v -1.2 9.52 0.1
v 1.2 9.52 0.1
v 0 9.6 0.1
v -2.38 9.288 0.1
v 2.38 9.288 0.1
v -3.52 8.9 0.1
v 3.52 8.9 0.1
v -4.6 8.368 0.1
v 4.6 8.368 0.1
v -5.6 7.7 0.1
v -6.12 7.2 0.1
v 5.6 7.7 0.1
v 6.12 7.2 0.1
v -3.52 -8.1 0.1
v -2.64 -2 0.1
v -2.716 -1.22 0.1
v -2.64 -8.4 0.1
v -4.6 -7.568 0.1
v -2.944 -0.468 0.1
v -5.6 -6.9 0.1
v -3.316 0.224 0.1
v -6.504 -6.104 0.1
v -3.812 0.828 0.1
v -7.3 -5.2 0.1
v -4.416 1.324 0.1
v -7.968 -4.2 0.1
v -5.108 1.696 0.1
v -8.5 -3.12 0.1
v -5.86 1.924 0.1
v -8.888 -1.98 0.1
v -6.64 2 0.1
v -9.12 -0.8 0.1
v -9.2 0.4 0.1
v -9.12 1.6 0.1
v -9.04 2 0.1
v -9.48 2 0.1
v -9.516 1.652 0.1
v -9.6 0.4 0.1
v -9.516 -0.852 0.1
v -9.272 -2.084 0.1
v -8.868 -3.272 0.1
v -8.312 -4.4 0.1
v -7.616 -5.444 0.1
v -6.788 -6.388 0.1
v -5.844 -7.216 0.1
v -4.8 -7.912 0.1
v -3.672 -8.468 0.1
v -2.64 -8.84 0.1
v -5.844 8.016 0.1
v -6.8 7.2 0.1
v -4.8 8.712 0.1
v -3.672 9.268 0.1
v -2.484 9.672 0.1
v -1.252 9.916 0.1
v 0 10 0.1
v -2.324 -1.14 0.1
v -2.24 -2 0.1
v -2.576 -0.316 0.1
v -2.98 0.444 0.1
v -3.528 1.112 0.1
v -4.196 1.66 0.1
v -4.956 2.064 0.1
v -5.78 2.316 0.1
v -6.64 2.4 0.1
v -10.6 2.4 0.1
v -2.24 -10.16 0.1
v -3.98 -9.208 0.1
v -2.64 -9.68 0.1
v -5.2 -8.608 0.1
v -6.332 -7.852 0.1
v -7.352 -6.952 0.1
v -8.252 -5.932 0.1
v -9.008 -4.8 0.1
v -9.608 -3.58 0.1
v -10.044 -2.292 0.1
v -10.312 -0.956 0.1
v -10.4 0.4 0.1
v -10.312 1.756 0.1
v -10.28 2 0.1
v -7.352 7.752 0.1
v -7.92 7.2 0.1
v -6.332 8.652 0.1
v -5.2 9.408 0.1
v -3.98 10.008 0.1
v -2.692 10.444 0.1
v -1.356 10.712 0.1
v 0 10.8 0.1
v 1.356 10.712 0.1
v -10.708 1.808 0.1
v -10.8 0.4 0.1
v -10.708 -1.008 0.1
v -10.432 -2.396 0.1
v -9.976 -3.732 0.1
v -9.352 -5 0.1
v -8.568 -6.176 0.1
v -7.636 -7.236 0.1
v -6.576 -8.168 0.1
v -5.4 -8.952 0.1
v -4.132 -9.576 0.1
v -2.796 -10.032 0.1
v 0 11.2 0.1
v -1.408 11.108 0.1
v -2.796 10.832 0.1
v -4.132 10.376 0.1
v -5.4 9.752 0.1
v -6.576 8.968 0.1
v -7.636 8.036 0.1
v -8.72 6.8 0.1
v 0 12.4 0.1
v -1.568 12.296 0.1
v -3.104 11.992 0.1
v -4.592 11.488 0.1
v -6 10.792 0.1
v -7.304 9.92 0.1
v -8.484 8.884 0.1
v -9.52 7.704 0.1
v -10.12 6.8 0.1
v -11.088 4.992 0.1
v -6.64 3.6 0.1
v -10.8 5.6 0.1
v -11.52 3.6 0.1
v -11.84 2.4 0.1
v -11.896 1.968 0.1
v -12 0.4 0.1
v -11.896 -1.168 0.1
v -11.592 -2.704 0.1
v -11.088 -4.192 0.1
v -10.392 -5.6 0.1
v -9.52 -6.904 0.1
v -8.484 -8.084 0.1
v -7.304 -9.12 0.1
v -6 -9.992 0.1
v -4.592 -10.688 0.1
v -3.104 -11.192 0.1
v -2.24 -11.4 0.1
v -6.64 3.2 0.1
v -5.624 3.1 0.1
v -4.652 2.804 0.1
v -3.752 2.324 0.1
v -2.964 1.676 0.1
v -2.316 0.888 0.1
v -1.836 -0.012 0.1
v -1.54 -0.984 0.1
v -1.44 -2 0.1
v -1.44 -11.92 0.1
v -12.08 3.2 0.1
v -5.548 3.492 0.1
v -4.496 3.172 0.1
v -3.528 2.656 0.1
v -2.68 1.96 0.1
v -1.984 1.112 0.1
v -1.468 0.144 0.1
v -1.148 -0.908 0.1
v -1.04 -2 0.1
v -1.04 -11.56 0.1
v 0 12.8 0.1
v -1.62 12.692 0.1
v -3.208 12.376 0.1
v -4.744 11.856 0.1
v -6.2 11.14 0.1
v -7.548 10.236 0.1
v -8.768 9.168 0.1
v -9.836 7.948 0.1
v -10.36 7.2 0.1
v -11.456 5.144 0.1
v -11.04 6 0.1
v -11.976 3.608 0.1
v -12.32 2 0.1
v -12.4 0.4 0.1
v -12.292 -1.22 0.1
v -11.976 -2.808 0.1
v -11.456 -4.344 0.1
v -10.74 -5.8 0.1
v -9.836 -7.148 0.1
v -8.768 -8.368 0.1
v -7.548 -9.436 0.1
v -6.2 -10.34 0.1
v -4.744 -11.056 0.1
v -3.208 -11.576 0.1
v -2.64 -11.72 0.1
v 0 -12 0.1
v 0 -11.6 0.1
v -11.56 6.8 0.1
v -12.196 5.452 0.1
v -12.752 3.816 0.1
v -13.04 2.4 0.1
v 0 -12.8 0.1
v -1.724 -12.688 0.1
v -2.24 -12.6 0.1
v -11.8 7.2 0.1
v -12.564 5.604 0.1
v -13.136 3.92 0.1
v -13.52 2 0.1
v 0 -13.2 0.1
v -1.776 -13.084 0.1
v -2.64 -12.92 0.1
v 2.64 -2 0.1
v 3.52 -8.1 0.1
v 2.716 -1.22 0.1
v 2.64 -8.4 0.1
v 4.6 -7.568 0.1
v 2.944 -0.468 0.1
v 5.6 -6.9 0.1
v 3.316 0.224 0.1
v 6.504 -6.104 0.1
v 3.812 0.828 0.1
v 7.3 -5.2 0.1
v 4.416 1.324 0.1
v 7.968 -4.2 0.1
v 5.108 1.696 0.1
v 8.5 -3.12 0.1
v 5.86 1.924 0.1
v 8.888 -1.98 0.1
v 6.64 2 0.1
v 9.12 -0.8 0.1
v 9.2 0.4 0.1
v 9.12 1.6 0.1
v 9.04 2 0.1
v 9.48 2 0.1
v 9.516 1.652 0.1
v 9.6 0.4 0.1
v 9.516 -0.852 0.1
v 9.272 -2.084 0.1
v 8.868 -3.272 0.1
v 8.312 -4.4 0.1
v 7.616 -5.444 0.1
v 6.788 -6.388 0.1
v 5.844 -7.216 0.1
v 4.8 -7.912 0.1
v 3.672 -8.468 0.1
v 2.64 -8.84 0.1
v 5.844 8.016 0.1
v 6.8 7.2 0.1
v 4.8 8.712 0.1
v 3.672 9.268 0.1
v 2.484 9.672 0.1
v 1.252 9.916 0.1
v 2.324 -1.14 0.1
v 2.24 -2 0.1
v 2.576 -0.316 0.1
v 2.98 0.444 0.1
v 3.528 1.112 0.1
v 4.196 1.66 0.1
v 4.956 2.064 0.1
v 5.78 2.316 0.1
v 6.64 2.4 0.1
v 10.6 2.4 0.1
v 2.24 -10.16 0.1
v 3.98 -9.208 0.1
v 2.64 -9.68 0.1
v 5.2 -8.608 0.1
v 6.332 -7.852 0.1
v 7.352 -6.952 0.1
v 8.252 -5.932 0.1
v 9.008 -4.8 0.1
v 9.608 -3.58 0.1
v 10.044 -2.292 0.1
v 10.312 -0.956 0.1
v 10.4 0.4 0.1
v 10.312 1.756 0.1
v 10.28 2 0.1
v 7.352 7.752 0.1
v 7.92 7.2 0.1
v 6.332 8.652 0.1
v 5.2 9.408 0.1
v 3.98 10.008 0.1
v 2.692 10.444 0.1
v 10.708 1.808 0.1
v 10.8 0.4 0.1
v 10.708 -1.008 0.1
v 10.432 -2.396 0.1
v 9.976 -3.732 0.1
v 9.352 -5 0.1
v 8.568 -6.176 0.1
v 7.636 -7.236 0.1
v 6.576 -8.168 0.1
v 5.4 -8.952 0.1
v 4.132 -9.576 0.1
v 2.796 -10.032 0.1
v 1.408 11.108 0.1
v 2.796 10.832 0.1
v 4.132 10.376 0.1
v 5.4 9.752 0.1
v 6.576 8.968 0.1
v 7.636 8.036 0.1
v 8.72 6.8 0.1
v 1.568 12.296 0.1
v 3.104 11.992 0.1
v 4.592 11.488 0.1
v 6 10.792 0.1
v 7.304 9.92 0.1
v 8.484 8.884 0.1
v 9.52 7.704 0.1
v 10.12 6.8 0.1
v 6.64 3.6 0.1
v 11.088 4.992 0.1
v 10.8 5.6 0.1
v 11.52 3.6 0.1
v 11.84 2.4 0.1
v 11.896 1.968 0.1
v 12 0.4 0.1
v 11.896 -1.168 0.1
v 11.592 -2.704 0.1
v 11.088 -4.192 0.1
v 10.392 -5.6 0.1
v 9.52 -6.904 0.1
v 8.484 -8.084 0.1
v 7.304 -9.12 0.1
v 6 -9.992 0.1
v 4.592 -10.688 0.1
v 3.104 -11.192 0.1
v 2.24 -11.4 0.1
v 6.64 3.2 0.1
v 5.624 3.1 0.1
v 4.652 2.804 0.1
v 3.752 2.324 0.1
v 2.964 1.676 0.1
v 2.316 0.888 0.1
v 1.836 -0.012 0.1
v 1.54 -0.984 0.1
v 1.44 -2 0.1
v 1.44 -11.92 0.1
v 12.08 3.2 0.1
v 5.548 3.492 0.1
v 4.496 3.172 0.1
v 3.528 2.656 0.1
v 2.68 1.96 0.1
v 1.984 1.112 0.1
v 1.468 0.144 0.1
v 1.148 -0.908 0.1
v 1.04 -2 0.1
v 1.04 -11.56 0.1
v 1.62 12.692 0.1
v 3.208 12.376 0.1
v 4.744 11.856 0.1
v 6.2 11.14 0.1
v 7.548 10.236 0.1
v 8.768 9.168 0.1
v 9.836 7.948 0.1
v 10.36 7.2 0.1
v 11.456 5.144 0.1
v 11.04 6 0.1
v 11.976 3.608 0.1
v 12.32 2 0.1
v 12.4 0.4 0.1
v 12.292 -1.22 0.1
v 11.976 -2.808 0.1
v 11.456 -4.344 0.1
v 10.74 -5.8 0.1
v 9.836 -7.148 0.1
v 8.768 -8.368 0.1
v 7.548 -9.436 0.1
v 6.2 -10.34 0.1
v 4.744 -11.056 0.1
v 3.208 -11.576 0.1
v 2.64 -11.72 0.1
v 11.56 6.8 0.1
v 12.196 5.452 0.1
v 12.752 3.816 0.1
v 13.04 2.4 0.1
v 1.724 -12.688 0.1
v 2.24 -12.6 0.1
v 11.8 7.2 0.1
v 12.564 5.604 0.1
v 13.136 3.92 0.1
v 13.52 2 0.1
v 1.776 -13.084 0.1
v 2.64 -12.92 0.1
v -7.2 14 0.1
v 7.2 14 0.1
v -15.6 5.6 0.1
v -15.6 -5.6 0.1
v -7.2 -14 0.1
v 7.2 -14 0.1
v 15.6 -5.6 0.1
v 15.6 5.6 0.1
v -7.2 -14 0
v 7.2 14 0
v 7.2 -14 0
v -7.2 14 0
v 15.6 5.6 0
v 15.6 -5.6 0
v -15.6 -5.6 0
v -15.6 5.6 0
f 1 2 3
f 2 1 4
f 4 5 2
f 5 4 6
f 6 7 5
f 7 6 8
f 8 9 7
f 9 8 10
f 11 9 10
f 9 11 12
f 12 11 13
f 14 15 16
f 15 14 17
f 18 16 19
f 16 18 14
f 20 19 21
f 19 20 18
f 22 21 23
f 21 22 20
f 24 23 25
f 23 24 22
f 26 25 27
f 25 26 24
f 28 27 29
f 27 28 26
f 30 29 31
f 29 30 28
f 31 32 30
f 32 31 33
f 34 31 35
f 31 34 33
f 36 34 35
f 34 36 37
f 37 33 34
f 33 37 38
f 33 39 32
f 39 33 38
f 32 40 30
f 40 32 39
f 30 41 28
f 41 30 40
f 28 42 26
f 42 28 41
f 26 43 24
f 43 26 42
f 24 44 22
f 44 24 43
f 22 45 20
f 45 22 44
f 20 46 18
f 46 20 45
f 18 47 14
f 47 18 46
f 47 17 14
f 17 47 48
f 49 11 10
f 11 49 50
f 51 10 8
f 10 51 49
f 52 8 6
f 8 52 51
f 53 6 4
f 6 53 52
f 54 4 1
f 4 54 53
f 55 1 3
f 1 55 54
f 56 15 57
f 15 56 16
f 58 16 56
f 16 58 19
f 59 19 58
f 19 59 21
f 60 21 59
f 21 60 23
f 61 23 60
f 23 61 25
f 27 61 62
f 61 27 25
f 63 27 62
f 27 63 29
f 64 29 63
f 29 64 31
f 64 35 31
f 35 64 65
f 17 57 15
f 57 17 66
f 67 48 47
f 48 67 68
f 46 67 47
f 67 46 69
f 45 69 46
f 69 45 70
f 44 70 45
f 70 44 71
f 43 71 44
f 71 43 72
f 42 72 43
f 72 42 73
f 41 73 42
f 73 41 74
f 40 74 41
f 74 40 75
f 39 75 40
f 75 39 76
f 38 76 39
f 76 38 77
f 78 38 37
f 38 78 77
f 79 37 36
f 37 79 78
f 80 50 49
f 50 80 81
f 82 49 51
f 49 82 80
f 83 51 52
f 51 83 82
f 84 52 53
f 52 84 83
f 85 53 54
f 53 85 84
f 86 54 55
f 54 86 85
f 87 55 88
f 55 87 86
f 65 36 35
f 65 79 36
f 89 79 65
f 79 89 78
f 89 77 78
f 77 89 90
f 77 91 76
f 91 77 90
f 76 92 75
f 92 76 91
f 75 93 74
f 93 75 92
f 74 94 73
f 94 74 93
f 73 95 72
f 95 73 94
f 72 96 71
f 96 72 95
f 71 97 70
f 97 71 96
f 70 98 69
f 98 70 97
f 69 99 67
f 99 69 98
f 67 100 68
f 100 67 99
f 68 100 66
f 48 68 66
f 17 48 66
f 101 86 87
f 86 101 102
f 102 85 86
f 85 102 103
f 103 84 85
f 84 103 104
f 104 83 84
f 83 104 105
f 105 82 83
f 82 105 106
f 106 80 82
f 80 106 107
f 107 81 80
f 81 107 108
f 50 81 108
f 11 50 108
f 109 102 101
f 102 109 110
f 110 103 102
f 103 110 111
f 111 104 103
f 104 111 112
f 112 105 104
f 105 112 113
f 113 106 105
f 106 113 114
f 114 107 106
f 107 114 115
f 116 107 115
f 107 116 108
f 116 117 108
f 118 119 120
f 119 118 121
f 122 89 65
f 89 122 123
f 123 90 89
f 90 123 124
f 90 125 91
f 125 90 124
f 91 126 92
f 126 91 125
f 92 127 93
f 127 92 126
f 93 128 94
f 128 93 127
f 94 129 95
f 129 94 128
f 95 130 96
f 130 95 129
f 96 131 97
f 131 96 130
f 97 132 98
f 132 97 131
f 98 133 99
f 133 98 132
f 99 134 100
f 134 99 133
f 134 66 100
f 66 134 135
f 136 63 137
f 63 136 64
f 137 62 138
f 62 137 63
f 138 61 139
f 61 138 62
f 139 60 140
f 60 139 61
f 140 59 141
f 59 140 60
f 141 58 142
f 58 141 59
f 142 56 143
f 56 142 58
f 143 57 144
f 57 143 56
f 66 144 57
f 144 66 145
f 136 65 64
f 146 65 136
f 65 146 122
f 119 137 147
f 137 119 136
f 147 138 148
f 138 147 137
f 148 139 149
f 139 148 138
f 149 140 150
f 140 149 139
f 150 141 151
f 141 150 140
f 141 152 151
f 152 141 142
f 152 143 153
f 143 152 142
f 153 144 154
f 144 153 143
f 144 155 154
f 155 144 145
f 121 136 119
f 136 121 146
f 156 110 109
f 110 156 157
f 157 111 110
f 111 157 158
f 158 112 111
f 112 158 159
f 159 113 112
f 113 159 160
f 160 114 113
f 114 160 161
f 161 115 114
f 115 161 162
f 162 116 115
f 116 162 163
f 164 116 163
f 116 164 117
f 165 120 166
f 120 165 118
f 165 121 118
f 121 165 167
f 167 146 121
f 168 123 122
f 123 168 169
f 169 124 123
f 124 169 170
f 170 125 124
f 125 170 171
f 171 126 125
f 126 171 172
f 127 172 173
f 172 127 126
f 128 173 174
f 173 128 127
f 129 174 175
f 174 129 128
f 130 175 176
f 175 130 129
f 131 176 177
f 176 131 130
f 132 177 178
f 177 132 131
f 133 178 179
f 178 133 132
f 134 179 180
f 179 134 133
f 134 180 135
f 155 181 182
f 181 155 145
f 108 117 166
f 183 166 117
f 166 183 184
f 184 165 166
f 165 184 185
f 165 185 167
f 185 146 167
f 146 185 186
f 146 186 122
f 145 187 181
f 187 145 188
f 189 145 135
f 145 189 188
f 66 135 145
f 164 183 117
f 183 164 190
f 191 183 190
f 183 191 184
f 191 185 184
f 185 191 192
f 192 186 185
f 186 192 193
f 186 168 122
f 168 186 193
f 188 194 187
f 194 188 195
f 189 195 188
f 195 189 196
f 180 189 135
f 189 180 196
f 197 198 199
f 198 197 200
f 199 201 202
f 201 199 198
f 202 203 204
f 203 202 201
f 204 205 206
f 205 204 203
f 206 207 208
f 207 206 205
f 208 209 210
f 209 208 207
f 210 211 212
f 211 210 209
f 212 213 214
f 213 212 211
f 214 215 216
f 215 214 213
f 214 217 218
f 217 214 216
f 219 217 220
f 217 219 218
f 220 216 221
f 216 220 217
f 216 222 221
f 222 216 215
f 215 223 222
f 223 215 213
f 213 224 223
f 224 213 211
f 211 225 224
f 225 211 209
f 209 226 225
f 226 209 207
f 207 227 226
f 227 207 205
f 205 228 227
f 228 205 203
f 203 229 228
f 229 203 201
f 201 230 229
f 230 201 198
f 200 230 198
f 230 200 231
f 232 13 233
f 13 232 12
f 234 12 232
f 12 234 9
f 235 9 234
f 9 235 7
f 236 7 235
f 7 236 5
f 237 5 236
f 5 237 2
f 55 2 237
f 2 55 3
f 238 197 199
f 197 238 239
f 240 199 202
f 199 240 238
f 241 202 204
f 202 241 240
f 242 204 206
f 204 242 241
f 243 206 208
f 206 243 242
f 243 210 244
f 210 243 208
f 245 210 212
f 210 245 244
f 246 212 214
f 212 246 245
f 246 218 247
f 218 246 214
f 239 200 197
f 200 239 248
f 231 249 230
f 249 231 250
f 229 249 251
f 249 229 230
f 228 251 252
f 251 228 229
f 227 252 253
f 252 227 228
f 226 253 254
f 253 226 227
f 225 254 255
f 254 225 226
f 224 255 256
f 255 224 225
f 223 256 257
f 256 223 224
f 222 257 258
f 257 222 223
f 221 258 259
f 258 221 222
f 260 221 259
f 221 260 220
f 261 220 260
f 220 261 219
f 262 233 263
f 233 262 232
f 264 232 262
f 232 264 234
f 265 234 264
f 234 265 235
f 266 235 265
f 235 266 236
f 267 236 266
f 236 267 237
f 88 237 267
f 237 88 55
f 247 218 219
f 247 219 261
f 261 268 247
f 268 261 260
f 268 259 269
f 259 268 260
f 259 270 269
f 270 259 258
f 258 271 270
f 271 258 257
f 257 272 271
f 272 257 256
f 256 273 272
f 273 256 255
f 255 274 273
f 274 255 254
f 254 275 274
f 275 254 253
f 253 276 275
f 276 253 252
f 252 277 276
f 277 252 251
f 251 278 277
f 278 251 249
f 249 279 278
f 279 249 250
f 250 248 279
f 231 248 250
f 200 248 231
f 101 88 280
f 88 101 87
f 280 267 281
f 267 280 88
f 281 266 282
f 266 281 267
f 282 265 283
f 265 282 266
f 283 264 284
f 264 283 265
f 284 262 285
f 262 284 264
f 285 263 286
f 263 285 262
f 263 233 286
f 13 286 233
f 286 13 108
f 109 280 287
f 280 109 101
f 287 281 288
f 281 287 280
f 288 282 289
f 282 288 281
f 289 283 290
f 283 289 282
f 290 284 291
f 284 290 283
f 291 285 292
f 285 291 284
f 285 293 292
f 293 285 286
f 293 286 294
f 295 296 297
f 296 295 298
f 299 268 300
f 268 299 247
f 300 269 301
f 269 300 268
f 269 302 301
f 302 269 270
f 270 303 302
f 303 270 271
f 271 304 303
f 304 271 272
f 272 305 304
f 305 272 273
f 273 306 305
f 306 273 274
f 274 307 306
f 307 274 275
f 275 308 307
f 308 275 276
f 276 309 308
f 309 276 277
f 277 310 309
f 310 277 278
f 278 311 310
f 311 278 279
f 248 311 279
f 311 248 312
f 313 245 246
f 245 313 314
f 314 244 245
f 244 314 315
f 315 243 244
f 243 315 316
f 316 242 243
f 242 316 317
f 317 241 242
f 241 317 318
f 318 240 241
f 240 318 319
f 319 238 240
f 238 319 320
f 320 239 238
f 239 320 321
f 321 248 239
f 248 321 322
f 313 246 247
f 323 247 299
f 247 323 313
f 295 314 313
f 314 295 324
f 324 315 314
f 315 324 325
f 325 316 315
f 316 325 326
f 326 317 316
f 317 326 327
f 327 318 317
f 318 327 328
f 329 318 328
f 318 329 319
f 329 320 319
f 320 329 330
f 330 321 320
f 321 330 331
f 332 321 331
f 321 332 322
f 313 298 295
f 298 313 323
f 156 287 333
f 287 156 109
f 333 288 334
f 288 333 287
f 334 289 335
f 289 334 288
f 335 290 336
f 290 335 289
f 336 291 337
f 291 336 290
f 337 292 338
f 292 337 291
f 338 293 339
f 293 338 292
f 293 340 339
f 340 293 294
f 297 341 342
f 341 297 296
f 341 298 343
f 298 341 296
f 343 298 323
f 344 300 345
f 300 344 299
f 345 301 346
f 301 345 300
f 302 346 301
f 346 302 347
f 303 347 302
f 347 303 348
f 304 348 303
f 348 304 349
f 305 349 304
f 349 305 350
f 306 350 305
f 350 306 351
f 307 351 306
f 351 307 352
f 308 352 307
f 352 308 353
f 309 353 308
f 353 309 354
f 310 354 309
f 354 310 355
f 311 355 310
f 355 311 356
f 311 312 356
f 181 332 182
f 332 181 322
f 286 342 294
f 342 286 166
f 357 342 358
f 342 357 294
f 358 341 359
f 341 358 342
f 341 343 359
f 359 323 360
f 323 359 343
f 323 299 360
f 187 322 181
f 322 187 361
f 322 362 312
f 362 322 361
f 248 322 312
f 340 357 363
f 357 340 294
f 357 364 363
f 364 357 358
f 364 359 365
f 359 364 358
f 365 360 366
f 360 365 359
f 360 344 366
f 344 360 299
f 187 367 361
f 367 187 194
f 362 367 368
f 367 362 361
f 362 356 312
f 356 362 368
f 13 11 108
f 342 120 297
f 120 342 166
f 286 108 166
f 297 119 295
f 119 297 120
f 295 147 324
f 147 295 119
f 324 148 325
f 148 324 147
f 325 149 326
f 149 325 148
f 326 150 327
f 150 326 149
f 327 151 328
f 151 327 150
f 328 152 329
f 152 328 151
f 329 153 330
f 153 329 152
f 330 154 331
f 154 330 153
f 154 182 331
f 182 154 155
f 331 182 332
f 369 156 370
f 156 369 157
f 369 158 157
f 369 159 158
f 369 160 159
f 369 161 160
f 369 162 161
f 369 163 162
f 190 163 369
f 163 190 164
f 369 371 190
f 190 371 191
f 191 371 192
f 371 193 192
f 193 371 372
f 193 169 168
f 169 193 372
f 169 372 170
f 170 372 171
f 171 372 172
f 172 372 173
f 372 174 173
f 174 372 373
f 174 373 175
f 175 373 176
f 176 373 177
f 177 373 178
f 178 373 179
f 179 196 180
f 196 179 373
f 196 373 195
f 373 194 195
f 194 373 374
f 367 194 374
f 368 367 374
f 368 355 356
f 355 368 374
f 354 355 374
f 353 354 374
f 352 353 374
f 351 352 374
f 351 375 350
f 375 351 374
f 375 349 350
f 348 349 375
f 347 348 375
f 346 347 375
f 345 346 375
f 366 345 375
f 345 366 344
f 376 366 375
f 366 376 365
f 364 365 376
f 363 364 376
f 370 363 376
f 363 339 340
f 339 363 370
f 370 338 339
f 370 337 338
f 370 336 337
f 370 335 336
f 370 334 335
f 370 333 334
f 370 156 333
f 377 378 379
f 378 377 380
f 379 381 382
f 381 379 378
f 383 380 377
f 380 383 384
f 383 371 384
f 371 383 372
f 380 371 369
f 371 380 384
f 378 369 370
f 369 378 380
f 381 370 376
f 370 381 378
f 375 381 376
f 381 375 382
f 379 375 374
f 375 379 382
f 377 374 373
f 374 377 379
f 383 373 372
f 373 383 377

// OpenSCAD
use <../lib.scad>
use <s/163555fs01.scad>
function ldraw_lib__163555f() = [
// 0 Sticker  3.5 x  3.9 Octagon with Airport Shuttle Logo
// 0 Name: 163555f.dat
// 0 Author: Takeshi Takahashi [RainbowDolphin]
// 0 !LDRAW_ORG Part UPDATE 2023-02
// 0 !LICENSE Licensed under CC BY 4.0 : see CAreadme.txt
// 
// 0 BFC CERTIFY CCW
  [0,"BFC","CERTIFY"],
  [0,"BFC","CCW"],
// 
// 0 !KEYWORDS Bricklink 6399stk01, Brickowl 458337, Monorail, Rebrickable 163555
// 0 !KEYWORDS set 6399, Station
// 
// 0 !HISTORY 2023-04-17 [OrionP] Official Update 2023-02
// 
// 
// 0 BFC NOCLIP
  [0,"BFC","NOCLIP"],
// 
// 1 16 0 -.25 0 1 0 0 0 1 0 0 0 1 s\163555fs01.dat
  [1,16,0,-.25,0,1,0,0,0,1,0,0,0,1, ldraw_lib__s__163555fs01()],
// 0 BFC CLIP
  [0,"BFC","CLIP"],
// 4 16 18 0 35 18 0 -35 -18 0 -35 -18 0 35
  [4,16,18,0,35,18,0,-35,-18,0,-35,-18,0,35],
// 4 16 18 0 35 39 0 14 39 0 -14 18 0 -35
  [4,16,18,0,35,39,0,14,39,0,-14,18,0,-35],
// 4 16 -18 0 35 -18 0 -35 -39 0 -14 -39 0 14
  [4,16,-18,0,35,-18,0,-35,-39,0,-14,-39,0,14],
// 4 16 -39 -.25 14 -39 0 14 -39 0 -14 -39 -.25 -14
  [4,16,-39,-.25,14,-39,0,14,-39,0,-14,-39,-.25,-14],
// 4 16 -18 -.25 35 -18 0 35 -39 0 14 -39 -.25 14
  [4,16,-18,-.25,35,-18,0,35,-39,0,14,-39,-.25,14],
// 4 16 18 -.25 35 18 0 35 -18 0 35 -18 -.25 35
  [4,16,18,-.25,35,18,0,35,-18,0,35,-18,-.25,35],
// 4 16 39 -.25 14 39 0 14 18 0 35 18 -.25 35
  [4,16,39,-.25,14,39,0,14,18,0,35,18,-.25,35],
// 4 16 39 -.25 -14 39 0 -14 39 0 14 39 -.25 14
  [4,16,39,-.25,-14,39,0,-14,39,0,14,39,-.25,14],
// 4 16 18 -.25 -35 18 0 -35 39 0 -14 39 -.25 -14
  [4,16,18,-.25,-35,18,0,-35,39,0,-14,39,-.25,-14],
// 4 16 -18 -.25 -35 -18 0 -35 18 0 -35 18 -.25 -35
  [4,16,-18,-.25,-35,-18,0,-35,18,0,-35,18,-.25,-35],
// 4 16 -39 -.25 -14 -39 0 -14 -18 0 -35 -18 -.25 -35
  [4,16,-39,-.25,-14,-39,0,-14,-18,0,-35,-18,-.25,-35],
];
module ldraw_lib__163555f(step=0, col=false, unit=2/5, alt=false, line=0.2, solid=!$preview)
    makepoly(ldraw_lib__163555f(), step=step, col=col, unit=unit, alt=alt, line=line, solid=solid);
ldraw_lib__163555f(line=0.2);
